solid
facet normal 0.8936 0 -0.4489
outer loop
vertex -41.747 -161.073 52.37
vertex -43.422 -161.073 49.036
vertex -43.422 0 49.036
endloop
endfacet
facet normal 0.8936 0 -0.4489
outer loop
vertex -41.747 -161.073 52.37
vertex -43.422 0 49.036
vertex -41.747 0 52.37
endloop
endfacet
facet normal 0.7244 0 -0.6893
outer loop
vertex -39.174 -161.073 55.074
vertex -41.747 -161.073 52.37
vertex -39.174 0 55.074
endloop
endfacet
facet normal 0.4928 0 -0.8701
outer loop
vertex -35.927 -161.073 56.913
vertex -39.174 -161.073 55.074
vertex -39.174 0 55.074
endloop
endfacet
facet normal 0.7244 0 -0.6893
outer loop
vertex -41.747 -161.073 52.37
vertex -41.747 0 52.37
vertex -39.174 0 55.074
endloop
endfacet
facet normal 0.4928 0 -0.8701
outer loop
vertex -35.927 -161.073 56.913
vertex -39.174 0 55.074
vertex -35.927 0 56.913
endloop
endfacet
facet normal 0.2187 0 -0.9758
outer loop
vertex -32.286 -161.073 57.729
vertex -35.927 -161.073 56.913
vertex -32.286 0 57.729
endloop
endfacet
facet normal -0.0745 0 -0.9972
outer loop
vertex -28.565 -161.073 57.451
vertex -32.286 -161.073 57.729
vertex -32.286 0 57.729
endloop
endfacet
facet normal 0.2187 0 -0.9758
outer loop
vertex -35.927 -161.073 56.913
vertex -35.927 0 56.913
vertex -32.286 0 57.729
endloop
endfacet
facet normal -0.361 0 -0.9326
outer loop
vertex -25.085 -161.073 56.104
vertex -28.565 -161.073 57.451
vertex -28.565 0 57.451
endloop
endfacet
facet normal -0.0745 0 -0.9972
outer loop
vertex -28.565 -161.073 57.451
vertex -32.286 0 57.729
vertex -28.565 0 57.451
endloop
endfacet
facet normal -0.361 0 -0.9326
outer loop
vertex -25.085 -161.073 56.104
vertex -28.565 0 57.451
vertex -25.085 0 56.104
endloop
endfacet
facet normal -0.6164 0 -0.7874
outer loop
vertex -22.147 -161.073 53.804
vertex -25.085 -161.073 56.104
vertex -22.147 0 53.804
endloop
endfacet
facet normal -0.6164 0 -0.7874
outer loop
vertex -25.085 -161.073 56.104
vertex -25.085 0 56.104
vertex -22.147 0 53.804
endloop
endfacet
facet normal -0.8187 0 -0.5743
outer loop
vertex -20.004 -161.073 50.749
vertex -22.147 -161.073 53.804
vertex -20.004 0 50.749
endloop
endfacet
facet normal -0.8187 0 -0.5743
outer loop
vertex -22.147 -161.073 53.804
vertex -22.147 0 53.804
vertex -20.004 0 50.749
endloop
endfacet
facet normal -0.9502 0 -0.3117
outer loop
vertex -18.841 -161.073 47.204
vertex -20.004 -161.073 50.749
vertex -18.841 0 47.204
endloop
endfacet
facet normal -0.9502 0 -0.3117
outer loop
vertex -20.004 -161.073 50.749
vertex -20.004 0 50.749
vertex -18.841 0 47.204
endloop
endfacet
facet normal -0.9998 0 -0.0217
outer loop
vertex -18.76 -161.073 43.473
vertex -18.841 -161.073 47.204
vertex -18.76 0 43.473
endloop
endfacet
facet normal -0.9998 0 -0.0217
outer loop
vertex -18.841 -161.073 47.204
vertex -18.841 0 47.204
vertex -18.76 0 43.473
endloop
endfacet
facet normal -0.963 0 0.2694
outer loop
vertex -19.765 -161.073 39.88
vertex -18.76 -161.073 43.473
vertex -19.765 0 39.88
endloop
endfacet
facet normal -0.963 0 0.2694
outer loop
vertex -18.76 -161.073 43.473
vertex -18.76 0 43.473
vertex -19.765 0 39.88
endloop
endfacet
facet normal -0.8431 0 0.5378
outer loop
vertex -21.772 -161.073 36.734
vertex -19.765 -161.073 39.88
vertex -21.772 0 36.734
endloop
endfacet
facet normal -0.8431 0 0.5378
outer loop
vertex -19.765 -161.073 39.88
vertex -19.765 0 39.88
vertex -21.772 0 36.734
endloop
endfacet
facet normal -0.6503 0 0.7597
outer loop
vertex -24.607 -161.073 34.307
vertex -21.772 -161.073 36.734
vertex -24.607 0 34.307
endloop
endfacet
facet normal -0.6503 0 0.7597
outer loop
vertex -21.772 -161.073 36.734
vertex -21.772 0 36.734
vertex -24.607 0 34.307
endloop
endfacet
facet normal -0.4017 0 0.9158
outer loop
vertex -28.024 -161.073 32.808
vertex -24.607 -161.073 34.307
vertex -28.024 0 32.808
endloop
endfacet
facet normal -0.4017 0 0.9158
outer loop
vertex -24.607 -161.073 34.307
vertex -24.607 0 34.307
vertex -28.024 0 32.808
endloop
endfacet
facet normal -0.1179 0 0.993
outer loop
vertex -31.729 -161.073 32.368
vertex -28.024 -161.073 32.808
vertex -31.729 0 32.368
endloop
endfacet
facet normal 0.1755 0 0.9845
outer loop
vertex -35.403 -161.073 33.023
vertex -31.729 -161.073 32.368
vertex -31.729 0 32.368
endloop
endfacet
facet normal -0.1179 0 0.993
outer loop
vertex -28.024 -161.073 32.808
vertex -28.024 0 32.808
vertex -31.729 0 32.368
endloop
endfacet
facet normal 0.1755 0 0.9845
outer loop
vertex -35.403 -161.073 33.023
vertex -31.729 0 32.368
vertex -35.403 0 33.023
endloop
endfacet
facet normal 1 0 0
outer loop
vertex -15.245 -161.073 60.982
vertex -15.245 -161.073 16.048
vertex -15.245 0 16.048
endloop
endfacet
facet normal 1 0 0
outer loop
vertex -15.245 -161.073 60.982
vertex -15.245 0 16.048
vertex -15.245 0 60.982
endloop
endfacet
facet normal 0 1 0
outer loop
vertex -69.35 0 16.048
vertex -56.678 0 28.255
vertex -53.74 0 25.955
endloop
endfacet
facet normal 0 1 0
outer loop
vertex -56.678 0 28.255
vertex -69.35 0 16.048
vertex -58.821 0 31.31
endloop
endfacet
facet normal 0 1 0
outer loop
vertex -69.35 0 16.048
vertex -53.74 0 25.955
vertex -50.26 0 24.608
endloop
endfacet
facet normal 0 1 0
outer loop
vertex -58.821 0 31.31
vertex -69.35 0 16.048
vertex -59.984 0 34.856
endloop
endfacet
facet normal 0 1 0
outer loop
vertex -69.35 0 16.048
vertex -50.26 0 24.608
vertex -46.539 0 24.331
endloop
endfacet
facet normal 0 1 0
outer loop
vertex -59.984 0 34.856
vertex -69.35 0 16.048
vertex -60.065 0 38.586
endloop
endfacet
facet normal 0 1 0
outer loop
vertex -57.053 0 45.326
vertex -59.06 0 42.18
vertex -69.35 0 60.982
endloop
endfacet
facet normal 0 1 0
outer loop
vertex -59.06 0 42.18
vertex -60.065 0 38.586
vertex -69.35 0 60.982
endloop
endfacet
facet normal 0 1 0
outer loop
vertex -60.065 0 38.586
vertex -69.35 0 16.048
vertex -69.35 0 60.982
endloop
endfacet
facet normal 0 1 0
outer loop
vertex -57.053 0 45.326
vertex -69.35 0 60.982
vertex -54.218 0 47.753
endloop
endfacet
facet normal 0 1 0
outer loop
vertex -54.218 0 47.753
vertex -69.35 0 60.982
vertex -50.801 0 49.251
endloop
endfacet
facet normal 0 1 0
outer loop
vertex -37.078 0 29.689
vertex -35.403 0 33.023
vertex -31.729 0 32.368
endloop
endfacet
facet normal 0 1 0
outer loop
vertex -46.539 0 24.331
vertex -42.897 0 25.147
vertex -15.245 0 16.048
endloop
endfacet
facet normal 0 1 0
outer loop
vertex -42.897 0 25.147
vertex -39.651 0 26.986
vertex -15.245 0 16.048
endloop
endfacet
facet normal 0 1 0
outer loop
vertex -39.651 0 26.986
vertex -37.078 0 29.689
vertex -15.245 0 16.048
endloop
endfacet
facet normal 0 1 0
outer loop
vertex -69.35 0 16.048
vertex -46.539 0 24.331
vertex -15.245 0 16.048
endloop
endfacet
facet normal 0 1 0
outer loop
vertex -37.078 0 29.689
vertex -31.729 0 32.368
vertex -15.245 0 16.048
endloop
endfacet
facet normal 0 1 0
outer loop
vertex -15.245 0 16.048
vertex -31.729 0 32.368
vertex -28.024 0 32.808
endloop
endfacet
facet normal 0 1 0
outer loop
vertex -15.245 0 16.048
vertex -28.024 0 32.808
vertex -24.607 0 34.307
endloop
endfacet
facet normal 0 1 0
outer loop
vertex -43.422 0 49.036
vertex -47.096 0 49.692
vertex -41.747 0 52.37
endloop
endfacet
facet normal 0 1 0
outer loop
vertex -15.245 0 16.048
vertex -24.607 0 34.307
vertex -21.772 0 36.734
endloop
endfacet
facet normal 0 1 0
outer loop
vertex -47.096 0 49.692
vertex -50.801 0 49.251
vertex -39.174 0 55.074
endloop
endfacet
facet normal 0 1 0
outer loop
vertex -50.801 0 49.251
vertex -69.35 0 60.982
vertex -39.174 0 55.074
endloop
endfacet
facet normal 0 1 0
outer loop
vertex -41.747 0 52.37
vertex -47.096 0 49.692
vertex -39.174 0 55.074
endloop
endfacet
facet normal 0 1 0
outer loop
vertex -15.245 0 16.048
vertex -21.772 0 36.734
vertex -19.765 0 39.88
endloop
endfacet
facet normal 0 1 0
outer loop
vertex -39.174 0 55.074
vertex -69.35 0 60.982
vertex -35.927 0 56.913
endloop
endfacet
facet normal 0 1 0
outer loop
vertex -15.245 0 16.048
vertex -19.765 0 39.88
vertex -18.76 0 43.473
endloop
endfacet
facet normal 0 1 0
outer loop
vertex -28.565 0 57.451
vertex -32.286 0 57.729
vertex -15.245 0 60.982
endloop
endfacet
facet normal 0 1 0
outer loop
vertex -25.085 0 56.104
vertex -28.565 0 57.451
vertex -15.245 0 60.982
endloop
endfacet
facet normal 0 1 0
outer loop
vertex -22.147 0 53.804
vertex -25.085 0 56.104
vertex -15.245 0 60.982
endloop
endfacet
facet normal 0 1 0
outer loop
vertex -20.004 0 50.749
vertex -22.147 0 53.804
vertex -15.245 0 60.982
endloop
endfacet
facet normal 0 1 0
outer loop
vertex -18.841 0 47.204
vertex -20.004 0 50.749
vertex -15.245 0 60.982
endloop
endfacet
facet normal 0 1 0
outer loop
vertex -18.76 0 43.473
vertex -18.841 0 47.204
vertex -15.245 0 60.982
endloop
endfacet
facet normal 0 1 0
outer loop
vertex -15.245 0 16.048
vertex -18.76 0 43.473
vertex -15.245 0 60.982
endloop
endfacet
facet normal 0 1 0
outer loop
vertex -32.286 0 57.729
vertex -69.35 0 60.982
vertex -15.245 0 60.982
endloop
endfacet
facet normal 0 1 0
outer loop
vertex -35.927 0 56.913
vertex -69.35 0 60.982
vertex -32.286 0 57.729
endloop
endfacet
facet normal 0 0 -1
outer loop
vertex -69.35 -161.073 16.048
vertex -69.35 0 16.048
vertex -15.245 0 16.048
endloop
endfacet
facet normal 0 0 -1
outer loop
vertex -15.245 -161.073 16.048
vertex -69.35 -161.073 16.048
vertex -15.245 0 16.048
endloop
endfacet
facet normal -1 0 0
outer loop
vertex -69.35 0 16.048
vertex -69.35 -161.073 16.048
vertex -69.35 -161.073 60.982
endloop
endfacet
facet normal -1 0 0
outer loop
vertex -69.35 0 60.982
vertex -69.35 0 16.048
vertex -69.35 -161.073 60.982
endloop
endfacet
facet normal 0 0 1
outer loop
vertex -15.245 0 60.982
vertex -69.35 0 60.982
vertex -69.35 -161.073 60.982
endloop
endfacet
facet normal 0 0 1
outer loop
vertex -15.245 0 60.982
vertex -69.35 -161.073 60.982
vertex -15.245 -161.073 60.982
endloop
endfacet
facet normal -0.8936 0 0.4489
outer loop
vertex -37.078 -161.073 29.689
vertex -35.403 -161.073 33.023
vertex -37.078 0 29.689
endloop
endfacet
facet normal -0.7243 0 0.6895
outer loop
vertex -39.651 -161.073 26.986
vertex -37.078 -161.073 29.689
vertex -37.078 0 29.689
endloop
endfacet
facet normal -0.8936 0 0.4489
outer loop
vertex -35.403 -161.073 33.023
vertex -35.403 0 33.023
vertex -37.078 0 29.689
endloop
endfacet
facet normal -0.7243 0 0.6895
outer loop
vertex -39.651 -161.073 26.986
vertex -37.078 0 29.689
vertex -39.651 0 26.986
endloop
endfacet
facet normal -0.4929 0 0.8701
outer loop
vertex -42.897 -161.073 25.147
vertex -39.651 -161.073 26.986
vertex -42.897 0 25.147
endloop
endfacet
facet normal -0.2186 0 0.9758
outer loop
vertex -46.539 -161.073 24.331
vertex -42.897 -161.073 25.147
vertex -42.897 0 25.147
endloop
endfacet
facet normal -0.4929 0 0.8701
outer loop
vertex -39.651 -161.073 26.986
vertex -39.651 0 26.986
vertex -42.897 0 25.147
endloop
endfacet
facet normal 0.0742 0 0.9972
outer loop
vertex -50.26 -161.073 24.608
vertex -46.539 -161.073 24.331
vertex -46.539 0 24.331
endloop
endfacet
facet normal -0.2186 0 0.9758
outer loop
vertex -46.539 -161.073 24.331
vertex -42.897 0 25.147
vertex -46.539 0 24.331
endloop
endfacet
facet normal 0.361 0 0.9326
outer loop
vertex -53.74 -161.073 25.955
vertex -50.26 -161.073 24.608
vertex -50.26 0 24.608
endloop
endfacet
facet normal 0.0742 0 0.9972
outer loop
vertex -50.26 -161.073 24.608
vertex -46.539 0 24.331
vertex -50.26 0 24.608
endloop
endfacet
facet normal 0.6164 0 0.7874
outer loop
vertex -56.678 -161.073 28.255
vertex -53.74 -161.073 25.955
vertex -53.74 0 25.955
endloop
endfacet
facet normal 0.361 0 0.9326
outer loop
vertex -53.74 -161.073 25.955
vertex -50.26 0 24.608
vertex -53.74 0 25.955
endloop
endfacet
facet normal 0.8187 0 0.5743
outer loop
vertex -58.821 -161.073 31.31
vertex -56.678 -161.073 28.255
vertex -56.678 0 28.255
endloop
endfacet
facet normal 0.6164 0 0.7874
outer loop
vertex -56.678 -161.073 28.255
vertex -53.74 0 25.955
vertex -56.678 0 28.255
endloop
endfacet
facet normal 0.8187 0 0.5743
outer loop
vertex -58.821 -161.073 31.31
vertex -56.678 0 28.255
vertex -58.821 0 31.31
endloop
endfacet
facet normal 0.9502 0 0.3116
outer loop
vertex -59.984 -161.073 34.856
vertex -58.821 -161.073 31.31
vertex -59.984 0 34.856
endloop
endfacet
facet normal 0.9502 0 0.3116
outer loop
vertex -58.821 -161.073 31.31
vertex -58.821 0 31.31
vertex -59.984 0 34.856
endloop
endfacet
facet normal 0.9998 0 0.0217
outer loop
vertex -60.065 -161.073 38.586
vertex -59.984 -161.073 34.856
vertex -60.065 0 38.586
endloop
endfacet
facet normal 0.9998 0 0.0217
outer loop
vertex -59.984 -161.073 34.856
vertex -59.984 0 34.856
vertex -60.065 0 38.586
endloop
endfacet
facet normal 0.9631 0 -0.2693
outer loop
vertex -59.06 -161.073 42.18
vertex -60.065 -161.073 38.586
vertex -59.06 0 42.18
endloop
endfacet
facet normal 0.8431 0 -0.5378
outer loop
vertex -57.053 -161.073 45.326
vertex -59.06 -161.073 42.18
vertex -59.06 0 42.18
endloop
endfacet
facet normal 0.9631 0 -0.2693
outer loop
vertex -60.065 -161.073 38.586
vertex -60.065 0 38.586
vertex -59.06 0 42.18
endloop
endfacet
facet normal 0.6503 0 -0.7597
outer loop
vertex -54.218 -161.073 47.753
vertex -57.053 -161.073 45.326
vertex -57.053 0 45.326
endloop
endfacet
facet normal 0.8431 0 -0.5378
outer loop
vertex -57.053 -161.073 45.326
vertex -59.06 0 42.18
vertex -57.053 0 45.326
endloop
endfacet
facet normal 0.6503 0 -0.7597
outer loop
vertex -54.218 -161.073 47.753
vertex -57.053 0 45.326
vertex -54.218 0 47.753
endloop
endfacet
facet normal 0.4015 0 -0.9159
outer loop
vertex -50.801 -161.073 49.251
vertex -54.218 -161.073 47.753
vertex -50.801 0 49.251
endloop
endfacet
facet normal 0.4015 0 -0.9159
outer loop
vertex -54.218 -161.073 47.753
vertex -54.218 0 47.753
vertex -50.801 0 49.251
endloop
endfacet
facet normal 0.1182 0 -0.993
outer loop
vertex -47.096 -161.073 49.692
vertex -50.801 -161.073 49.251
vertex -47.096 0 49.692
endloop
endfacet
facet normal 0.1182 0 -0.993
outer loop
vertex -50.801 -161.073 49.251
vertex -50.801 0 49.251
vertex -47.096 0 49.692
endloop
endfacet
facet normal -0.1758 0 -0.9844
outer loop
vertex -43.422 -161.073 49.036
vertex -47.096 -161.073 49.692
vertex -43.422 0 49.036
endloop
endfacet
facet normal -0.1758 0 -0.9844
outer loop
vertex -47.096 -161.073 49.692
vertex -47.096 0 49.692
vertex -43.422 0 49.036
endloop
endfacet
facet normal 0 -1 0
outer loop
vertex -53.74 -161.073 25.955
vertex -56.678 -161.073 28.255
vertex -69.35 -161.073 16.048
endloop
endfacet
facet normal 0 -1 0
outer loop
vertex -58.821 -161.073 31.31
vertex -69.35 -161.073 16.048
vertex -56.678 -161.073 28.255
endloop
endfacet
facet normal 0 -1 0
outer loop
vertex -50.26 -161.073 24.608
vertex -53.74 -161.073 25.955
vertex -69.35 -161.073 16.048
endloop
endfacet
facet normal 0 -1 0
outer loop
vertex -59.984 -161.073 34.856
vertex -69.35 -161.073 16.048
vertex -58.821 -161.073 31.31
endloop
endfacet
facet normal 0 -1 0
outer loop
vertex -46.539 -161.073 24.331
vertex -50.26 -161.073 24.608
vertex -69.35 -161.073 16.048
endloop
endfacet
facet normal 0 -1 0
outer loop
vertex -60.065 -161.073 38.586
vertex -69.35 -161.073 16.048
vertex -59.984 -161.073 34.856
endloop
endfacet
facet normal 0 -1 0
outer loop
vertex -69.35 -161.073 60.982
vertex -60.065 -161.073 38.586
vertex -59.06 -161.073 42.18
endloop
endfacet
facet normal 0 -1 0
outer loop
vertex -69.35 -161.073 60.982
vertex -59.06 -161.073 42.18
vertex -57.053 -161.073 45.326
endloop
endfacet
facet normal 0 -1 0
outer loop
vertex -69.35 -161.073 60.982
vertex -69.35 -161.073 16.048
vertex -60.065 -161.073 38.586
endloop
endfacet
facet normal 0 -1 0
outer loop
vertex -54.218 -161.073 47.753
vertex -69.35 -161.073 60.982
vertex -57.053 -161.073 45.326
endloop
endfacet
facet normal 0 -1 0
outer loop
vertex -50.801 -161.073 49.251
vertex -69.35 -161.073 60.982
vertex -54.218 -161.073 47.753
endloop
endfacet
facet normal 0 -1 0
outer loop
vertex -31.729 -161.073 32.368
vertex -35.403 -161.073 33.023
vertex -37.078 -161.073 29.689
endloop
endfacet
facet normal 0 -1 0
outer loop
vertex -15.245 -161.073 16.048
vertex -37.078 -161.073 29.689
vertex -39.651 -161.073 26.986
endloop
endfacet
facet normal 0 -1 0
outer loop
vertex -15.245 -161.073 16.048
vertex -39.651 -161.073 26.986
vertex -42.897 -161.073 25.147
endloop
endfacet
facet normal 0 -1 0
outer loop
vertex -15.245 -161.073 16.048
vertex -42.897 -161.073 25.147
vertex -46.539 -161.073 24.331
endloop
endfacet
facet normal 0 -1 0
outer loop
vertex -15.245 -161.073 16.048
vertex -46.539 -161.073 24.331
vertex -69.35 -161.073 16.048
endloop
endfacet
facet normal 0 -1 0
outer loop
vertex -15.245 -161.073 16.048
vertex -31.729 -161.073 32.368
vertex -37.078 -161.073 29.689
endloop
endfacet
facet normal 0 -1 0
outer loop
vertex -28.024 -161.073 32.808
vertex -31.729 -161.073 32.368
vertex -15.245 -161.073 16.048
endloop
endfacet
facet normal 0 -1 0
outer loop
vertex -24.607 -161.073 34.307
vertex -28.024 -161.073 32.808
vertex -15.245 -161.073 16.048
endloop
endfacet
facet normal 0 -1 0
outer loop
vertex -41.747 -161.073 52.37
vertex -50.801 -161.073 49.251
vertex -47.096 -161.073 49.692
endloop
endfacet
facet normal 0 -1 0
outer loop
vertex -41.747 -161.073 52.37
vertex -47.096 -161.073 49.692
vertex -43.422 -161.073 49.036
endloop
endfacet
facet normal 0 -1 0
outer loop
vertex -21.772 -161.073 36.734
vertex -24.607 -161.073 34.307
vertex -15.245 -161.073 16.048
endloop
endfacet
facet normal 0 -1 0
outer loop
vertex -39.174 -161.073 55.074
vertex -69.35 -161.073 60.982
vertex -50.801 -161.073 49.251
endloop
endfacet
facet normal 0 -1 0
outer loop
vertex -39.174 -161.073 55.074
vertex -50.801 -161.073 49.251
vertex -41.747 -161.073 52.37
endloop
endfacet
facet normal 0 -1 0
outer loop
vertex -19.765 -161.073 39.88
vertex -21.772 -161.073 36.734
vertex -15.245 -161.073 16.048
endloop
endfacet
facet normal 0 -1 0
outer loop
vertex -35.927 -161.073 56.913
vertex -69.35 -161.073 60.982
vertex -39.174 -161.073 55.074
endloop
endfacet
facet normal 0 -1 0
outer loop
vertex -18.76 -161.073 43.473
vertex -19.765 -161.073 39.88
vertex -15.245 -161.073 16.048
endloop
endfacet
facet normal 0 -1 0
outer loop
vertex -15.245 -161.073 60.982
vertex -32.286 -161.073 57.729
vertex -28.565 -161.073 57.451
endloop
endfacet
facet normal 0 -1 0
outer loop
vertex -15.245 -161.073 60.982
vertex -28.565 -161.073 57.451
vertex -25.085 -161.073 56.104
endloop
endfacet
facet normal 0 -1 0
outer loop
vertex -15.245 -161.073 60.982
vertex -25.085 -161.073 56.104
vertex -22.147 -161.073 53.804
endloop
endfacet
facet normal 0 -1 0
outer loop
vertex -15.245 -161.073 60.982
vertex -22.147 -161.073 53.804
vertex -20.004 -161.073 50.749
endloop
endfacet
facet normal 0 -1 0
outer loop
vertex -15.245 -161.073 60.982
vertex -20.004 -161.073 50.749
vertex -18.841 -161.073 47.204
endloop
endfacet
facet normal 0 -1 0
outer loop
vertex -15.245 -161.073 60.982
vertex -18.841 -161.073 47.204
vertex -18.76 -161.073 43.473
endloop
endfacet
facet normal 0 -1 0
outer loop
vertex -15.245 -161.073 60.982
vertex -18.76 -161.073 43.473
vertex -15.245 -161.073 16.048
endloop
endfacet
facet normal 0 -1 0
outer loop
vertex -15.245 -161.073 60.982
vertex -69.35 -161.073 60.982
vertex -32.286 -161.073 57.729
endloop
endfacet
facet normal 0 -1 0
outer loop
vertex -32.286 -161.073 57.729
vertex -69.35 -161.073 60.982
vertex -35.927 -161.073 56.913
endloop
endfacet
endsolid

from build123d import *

# Parameters (mm, degrees)
F0_W     = 54.104183
F0_H     = 44.93398
F1_DEPTH = 161.07251
F4_D     = 25.4
F5_D     = 25.4


with BuildPart() as f1:
    # F0 (on Front) → F1 (new body)
    with BuildSketch(Plane.XZ):
        with Locations((-42.297548, 38.514842)):
            Rectangle(F0_W, F0_H)
    extrude(amount=F1_DEPTH)

    # F4 (through all)
    with Locations(Plane.XZ.offset(161.07251)):
        with Locations((-47.465287, 36.99689)):
            Hole(F4_D / 2)

    # F5 (through all)
    with Locations(Plane.XZ.offset(161.07251)):
        with Locations((-31.359639, 45.062546)):
            Hole(F5_D / 2)


solid = f1.part
